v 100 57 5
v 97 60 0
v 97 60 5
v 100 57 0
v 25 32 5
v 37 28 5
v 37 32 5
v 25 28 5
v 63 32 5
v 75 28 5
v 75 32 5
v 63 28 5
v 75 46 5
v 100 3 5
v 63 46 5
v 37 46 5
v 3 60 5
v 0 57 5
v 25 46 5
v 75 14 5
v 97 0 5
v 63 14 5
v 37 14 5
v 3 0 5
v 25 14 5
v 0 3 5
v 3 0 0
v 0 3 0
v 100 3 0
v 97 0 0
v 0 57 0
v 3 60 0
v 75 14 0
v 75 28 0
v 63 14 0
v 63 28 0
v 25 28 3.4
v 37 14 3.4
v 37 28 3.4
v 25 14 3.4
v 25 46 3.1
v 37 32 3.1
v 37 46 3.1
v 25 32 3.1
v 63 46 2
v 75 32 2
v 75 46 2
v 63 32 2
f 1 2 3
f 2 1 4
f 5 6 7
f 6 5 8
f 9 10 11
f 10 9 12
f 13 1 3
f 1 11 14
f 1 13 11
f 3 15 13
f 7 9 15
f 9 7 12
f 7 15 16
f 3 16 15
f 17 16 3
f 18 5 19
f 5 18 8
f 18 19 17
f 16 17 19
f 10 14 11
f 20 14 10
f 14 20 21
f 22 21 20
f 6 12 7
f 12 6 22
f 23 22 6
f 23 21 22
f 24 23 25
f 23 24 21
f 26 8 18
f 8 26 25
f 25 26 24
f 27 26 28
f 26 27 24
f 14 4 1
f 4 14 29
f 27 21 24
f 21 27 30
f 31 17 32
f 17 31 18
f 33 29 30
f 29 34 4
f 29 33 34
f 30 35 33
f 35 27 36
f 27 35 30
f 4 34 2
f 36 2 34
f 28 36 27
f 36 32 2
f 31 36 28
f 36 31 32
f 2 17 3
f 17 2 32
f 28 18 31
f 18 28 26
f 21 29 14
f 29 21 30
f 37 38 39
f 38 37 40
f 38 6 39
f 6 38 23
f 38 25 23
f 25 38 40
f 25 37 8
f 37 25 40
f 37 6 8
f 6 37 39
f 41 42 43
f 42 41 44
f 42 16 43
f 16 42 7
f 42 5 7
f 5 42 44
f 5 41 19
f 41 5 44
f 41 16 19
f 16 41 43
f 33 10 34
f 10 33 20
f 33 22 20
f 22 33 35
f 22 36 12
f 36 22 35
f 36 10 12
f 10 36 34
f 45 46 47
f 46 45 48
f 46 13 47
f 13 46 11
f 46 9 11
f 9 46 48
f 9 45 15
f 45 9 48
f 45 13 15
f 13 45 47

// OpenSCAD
$fn = 32;

// ----------------------------------------------------------------------
// Windowed plate: 4 voids, 100 x 60 x 5 mm
// ----------------------------------------------------------------------

// --- parameters (mm) ---
plate_l = 100;            // plate length, X
plate_w = 60;             // plate width, Y
plate_t = 5;              // plate thickness, Z
edge_margin = 12;         // wall from the plate edge to any window
win_l = 12;               // pocket length
win_w = 14;               // pocket width
pitch_x = 38;             // grid pitch along X
pitch_y = 18;             // grid pitch along Y
depth_1 = 1.6;            // depth of void 1 (full thickness = through)
depth_2 = 1.9;            // depth of void 2 (full thickness = through)
depth_3 = 5;              // depth of void 3 (full thickness = through)
depth_4 = 3;              // depth of void 4 (full thickness = through)
corner_c = 3;             // corner chamfer of the plate

profile = [[3, 0], [97, 0], [100, 3], [100, 57], [97, 60], [3, 60], [0, 57], [0, 3]];  // primary outline, 8 points, counter clockwise
void_1 = [[25, 14], [37, 14], [37, 28], [25, 28]];  // pocket at grid node 0,0, 4 points
void_2 = [[25, 32], [37, 32], [37, 46], [25, 46]];  // pocket at grid node 0,1, 4 points
void_3 = [[63, 14], [75, 14], [75, 28], [63, 28]];  // pocket at grid node 1,0, 4 points
void_4 = [[63, 32], [75, 32], [75, 46], [63, 46]];  // pocket at grid node 1,1, 4 points

// --- the one profile operation ---
difference() {
  linear_extrude(height = plate_t) polygon(points = profile);
  translate([0, 0, plate_t - depth_1])
    linear_extrude(height = depth_1 + 1) polygon(points = void_1);
  translate([0, 0, plate_t - depth_2])
    linear_extrude(height = depth_2 + 1) polygon(points = void_2);
  translate([0, 0, -1])
    linear_extrude(height = plate_t + 2) polygon(points = void_3);
  translate([0, 0, plate_t - depth_4])
    linear_extrude(height = depth_4 + 1) polygon(points = void_4);
}
